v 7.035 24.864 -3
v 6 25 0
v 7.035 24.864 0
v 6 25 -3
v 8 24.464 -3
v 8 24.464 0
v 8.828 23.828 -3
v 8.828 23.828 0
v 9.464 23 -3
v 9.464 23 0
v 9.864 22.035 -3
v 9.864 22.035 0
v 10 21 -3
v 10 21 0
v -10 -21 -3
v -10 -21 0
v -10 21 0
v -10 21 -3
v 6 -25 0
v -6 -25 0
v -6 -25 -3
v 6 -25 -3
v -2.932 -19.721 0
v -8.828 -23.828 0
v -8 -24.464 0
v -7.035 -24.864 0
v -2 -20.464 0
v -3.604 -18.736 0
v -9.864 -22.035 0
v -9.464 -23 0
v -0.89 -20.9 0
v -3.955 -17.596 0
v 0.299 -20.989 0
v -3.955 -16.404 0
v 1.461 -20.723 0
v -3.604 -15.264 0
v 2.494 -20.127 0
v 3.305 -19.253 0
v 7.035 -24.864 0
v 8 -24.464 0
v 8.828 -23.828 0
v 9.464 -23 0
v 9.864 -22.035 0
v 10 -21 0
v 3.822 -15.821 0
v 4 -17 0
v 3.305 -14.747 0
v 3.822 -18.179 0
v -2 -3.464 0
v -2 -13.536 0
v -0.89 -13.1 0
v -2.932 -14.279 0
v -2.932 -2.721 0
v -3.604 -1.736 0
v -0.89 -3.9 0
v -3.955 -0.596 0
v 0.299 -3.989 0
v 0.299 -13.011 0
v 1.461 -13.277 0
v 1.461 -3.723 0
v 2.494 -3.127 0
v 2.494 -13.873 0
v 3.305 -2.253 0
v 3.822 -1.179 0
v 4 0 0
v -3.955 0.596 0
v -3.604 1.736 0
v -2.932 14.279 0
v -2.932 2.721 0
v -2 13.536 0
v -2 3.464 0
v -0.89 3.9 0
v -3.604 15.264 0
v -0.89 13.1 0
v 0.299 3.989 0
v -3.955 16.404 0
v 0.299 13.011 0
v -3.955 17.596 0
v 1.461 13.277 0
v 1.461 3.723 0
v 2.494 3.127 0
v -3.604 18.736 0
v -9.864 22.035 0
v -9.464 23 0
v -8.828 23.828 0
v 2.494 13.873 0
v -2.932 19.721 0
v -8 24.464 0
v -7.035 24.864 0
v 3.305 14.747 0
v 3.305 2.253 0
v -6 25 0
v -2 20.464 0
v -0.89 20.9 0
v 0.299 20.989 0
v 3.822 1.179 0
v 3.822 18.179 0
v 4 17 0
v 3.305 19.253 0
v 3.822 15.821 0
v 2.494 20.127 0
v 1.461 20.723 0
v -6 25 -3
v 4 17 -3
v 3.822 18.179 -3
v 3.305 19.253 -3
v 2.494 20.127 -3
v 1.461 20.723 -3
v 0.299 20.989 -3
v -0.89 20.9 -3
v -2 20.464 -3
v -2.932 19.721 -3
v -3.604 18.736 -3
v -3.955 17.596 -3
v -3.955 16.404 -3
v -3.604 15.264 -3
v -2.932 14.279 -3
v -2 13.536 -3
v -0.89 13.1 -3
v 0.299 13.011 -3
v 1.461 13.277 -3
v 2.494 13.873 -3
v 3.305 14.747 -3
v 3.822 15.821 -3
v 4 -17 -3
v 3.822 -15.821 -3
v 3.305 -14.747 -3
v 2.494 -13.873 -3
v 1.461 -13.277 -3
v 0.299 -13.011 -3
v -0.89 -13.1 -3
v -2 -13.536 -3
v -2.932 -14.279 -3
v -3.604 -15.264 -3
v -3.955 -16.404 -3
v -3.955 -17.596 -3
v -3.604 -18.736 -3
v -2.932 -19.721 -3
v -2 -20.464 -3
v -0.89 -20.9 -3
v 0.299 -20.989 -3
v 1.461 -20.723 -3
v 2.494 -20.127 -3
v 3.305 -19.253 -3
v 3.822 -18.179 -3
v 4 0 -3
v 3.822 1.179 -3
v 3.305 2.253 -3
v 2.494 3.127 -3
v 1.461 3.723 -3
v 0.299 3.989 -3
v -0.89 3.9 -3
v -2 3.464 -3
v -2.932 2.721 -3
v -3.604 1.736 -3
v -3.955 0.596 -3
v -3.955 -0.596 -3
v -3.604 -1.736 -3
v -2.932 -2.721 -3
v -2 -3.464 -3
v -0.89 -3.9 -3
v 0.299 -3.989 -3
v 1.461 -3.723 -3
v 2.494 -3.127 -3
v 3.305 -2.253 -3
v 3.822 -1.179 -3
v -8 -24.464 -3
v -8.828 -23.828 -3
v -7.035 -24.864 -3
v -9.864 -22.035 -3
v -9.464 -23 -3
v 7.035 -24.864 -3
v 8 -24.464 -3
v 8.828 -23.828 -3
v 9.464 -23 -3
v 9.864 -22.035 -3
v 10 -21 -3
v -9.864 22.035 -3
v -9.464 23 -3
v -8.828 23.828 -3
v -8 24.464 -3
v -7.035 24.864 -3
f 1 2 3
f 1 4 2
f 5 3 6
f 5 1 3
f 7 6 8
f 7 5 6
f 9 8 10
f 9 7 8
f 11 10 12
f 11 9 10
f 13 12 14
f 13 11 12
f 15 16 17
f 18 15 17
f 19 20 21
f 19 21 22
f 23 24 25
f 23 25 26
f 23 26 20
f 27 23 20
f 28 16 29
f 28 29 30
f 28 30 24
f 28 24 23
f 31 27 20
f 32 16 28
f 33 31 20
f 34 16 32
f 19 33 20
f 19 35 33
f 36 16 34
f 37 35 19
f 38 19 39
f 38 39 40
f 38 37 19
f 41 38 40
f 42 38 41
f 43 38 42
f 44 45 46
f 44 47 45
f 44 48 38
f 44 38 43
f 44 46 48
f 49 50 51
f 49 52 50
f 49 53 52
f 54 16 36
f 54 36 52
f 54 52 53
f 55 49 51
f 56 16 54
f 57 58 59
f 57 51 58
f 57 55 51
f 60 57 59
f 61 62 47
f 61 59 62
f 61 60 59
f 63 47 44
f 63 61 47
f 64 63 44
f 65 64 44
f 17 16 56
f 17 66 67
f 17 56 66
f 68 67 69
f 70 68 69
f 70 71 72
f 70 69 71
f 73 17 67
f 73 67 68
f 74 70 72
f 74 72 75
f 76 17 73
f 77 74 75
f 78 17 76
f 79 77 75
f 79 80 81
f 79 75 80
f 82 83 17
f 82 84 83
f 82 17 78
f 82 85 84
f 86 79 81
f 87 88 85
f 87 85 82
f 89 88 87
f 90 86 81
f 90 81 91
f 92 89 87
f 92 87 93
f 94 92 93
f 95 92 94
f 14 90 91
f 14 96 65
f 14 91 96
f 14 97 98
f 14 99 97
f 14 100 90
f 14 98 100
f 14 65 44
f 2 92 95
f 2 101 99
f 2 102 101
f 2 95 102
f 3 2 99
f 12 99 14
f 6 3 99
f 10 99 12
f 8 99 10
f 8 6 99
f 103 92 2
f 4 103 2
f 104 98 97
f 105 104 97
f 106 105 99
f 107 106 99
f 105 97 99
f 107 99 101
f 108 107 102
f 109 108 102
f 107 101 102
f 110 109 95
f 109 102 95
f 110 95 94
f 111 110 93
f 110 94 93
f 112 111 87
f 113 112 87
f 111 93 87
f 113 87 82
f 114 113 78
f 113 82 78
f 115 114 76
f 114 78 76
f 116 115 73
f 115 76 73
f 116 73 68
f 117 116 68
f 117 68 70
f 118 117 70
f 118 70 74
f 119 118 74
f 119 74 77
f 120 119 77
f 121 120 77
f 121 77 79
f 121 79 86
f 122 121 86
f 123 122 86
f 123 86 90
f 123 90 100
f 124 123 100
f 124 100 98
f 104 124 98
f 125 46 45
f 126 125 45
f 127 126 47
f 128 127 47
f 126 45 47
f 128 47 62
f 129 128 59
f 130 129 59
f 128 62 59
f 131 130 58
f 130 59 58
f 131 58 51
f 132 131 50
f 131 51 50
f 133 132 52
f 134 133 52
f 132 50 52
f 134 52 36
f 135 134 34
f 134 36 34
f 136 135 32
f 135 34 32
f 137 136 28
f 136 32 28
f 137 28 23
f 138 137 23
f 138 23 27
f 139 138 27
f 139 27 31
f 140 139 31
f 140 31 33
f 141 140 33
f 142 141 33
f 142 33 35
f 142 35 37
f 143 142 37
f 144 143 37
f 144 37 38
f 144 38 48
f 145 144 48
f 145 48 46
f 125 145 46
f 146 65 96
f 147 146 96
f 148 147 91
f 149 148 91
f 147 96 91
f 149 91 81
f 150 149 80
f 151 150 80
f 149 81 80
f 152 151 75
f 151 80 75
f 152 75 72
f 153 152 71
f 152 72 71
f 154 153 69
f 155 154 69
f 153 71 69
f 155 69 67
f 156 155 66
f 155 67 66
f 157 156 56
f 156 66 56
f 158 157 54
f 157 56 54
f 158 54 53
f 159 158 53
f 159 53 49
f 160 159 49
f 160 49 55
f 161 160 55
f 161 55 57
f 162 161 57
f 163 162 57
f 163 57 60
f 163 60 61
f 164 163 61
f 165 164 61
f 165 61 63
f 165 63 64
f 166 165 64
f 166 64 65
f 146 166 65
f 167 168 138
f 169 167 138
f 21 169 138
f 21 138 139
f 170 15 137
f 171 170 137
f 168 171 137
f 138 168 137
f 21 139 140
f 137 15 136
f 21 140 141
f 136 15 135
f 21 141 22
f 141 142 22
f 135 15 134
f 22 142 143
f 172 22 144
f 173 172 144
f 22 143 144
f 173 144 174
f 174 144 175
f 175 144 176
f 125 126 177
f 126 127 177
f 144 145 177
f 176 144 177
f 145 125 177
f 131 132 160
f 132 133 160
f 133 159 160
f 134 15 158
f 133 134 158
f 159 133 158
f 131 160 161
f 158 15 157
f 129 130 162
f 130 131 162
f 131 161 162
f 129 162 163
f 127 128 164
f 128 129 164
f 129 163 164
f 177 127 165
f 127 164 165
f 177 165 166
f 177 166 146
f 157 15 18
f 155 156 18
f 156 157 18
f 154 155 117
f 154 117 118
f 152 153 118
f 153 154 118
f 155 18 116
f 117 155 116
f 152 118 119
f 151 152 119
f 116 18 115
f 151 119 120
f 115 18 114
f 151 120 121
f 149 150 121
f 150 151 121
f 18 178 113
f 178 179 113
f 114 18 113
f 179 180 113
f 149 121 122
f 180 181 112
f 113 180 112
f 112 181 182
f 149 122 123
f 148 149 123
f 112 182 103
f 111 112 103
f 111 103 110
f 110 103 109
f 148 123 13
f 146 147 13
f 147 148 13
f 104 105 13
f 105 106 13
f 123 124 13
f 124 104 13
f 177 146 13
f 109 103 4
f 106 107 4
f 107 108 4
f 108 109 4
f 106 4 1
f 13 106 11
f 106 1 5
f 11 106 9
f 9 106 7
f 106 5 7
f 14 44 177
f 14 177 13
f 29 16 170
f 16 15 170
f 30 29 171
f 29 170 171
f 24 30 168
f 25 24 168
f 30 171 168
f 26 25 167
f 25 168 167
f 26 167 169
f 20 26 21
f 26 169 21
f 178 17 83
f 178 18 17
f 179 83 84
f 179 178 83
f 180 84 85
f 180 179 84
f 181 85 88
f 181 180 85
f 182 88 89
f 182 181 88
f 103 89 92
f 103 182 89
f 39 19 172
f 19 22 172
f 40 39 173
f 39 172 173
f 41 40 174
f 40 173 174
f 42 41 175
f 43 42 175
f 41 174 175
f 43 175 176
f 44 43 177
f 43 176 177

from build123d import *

# Parameters (mm, degrees)
SKETCH_1_W             = 20
SKETCH_1_H             = 50
SM_BASE_FLANGE_1_DEPTH = 3
SKETCH_6_R             = 4
CUT_EXTRUDE_1_DEPTH    = 10
FILLET_1_R             = 4


# Sheet-metal steps are written as plain solids
with BuildPart() as part:
    # Sketch 1 → 基体-法兰1 (new body)
    with BuildSketch(Plane.XY):
        Rectangle(SKETCH_1_W, SKETCH_1_H)
    extrude(amount=-SM_BASE_FLANGE_1_DEPTH)

    # 草图6 → 切除-拉伸1 (cut)
    with BuildSketch(Plane.XY):
        with Locations((0, 17)):
            Circle(SKETCH_6_R)
        with Locations((0, -17)):
            Circle(SKETCH_6_R)
        Circle(SKETCH_6_R)
    extrude(amount=-CUT_EXTRUDE_1_DEPTH, mode=Mode.SUBTRACT)

    # 圆角1
    fillet_1_edges = [part.edges().sort_by_distance(p)[0] for p in [
        (10, -25, -1.5),
        (-10, -25, -1.5),
        (-10, 25, -1.5),
        (10, 25, -1.5),
    ]]
    fillet(fillet_1_edges, radius=FILLET_1_R)


solid = part.part
